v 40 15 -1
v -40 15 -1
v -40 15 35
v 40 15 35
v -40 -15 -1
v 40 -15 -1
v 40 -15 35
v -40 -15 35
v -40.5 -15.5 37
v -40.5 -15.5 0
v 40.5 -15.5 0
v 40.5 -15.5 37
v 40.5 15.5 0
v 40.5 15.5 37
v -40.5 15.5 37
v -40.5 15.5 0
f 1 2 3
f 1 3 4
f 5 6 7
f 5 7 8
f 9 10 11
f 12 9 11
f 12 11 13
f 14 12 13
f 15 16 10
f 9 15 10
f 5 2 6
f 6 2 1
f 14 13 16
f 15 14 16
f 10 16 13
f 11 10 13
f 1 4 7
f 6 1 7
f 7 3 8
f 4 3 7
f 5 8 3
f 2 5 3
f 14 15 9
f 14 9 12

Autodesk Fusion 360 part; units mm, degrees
sketch "Contact Patch" plane through (0, 0, 0) normal (0, 0, 1) x (1, 0, 0)
  line L0 (50, -20) -> (-50, -20)
  line L1 (-50, -20) -> (-50, 20)
  line L2 (-50, 20) -> (50, 20)
  line L3 (50, 20) -> (50, -20)
  line L4 (50, -20) -> (-50, 20) construction
  line L5 (-50, -20) -> (50, 20) construction
  dimension "d3" = 100
  dimension "d4" = 40
sketch "Tenon" plane through (0, 0, 0) normal (0, 0, 1) x (1, 0, 0)
  line L0 (40, -15) -> (-40, -15)
  line L1 (-40, -15) -> (-40, 15)
  line L2 (-40, 15) -> (40, 15)
  line L3 (40, 15) -> (40, -15)
  line L4 (40, -15) -> (-40, 15) construction
  line L5 (-40, -15) -> (40, 15) construction
  line L6 (-50, -20) -> (-50, 20)
  line L7 (-50, 20) -> (50, 20)
  dimension "d7" = 10
  dimension "d8" = 5
extrude "Extrude1" add sketch "Tenon" along normal blind 35 makes body 1
move_face "OffsetFaces1" offset 1 1 faces at (13.3333, 5, 0) on bodies 1
sketch "Sketch3" plane through (0, 0, 0) normal (0, 0, 1) x (1, 0, 0)
  line L0 (40, 15) -> (-40, 15)
  line L1 (-40, 15) -> (-40, -15)
  line L2 (-40, -15) -> (40, -15)
  line L3 (40, -15) -> (40, 15)
  line L4 (-40.5, -15.5) -> (40.5, -15.5)
  line L5 (40.5, -15.5) -> (40.5, 15.5)
  line L6 (40.5, 15.5) -> (-40.5, 15.5)
  line L7 (-40.5, 15.5) -> (-40.5, -15.5)
  dimension "d14" = 0.5
extrude "Extrude2" add sketch "Sketch3" along normal blind 37 separate body contours L0 L1 L2 L3 | L4 L5 L6 L7 makes body 2
equation "Length = 100 mm"
equation "Width = 40 mm"
equation "d3 = Length"
equation "d4 = Width"
equation "EndOffset = 10 mm"
equation "SideOffset = 5 mm"
equation "d7 = EndOffset"
equation "d8 = SideOffset"
equation "Tenon_length = 35 mm"
equation "d10 = Tenon_length"
equation "Clearance = 0.5 mm"
equation "d14 = Clearance"
equation "Bottom_gap = 2 mm"
equation "Mortise_length = Tenon_length + Bottom_gap"
equation "d17 = Mortise_length"
